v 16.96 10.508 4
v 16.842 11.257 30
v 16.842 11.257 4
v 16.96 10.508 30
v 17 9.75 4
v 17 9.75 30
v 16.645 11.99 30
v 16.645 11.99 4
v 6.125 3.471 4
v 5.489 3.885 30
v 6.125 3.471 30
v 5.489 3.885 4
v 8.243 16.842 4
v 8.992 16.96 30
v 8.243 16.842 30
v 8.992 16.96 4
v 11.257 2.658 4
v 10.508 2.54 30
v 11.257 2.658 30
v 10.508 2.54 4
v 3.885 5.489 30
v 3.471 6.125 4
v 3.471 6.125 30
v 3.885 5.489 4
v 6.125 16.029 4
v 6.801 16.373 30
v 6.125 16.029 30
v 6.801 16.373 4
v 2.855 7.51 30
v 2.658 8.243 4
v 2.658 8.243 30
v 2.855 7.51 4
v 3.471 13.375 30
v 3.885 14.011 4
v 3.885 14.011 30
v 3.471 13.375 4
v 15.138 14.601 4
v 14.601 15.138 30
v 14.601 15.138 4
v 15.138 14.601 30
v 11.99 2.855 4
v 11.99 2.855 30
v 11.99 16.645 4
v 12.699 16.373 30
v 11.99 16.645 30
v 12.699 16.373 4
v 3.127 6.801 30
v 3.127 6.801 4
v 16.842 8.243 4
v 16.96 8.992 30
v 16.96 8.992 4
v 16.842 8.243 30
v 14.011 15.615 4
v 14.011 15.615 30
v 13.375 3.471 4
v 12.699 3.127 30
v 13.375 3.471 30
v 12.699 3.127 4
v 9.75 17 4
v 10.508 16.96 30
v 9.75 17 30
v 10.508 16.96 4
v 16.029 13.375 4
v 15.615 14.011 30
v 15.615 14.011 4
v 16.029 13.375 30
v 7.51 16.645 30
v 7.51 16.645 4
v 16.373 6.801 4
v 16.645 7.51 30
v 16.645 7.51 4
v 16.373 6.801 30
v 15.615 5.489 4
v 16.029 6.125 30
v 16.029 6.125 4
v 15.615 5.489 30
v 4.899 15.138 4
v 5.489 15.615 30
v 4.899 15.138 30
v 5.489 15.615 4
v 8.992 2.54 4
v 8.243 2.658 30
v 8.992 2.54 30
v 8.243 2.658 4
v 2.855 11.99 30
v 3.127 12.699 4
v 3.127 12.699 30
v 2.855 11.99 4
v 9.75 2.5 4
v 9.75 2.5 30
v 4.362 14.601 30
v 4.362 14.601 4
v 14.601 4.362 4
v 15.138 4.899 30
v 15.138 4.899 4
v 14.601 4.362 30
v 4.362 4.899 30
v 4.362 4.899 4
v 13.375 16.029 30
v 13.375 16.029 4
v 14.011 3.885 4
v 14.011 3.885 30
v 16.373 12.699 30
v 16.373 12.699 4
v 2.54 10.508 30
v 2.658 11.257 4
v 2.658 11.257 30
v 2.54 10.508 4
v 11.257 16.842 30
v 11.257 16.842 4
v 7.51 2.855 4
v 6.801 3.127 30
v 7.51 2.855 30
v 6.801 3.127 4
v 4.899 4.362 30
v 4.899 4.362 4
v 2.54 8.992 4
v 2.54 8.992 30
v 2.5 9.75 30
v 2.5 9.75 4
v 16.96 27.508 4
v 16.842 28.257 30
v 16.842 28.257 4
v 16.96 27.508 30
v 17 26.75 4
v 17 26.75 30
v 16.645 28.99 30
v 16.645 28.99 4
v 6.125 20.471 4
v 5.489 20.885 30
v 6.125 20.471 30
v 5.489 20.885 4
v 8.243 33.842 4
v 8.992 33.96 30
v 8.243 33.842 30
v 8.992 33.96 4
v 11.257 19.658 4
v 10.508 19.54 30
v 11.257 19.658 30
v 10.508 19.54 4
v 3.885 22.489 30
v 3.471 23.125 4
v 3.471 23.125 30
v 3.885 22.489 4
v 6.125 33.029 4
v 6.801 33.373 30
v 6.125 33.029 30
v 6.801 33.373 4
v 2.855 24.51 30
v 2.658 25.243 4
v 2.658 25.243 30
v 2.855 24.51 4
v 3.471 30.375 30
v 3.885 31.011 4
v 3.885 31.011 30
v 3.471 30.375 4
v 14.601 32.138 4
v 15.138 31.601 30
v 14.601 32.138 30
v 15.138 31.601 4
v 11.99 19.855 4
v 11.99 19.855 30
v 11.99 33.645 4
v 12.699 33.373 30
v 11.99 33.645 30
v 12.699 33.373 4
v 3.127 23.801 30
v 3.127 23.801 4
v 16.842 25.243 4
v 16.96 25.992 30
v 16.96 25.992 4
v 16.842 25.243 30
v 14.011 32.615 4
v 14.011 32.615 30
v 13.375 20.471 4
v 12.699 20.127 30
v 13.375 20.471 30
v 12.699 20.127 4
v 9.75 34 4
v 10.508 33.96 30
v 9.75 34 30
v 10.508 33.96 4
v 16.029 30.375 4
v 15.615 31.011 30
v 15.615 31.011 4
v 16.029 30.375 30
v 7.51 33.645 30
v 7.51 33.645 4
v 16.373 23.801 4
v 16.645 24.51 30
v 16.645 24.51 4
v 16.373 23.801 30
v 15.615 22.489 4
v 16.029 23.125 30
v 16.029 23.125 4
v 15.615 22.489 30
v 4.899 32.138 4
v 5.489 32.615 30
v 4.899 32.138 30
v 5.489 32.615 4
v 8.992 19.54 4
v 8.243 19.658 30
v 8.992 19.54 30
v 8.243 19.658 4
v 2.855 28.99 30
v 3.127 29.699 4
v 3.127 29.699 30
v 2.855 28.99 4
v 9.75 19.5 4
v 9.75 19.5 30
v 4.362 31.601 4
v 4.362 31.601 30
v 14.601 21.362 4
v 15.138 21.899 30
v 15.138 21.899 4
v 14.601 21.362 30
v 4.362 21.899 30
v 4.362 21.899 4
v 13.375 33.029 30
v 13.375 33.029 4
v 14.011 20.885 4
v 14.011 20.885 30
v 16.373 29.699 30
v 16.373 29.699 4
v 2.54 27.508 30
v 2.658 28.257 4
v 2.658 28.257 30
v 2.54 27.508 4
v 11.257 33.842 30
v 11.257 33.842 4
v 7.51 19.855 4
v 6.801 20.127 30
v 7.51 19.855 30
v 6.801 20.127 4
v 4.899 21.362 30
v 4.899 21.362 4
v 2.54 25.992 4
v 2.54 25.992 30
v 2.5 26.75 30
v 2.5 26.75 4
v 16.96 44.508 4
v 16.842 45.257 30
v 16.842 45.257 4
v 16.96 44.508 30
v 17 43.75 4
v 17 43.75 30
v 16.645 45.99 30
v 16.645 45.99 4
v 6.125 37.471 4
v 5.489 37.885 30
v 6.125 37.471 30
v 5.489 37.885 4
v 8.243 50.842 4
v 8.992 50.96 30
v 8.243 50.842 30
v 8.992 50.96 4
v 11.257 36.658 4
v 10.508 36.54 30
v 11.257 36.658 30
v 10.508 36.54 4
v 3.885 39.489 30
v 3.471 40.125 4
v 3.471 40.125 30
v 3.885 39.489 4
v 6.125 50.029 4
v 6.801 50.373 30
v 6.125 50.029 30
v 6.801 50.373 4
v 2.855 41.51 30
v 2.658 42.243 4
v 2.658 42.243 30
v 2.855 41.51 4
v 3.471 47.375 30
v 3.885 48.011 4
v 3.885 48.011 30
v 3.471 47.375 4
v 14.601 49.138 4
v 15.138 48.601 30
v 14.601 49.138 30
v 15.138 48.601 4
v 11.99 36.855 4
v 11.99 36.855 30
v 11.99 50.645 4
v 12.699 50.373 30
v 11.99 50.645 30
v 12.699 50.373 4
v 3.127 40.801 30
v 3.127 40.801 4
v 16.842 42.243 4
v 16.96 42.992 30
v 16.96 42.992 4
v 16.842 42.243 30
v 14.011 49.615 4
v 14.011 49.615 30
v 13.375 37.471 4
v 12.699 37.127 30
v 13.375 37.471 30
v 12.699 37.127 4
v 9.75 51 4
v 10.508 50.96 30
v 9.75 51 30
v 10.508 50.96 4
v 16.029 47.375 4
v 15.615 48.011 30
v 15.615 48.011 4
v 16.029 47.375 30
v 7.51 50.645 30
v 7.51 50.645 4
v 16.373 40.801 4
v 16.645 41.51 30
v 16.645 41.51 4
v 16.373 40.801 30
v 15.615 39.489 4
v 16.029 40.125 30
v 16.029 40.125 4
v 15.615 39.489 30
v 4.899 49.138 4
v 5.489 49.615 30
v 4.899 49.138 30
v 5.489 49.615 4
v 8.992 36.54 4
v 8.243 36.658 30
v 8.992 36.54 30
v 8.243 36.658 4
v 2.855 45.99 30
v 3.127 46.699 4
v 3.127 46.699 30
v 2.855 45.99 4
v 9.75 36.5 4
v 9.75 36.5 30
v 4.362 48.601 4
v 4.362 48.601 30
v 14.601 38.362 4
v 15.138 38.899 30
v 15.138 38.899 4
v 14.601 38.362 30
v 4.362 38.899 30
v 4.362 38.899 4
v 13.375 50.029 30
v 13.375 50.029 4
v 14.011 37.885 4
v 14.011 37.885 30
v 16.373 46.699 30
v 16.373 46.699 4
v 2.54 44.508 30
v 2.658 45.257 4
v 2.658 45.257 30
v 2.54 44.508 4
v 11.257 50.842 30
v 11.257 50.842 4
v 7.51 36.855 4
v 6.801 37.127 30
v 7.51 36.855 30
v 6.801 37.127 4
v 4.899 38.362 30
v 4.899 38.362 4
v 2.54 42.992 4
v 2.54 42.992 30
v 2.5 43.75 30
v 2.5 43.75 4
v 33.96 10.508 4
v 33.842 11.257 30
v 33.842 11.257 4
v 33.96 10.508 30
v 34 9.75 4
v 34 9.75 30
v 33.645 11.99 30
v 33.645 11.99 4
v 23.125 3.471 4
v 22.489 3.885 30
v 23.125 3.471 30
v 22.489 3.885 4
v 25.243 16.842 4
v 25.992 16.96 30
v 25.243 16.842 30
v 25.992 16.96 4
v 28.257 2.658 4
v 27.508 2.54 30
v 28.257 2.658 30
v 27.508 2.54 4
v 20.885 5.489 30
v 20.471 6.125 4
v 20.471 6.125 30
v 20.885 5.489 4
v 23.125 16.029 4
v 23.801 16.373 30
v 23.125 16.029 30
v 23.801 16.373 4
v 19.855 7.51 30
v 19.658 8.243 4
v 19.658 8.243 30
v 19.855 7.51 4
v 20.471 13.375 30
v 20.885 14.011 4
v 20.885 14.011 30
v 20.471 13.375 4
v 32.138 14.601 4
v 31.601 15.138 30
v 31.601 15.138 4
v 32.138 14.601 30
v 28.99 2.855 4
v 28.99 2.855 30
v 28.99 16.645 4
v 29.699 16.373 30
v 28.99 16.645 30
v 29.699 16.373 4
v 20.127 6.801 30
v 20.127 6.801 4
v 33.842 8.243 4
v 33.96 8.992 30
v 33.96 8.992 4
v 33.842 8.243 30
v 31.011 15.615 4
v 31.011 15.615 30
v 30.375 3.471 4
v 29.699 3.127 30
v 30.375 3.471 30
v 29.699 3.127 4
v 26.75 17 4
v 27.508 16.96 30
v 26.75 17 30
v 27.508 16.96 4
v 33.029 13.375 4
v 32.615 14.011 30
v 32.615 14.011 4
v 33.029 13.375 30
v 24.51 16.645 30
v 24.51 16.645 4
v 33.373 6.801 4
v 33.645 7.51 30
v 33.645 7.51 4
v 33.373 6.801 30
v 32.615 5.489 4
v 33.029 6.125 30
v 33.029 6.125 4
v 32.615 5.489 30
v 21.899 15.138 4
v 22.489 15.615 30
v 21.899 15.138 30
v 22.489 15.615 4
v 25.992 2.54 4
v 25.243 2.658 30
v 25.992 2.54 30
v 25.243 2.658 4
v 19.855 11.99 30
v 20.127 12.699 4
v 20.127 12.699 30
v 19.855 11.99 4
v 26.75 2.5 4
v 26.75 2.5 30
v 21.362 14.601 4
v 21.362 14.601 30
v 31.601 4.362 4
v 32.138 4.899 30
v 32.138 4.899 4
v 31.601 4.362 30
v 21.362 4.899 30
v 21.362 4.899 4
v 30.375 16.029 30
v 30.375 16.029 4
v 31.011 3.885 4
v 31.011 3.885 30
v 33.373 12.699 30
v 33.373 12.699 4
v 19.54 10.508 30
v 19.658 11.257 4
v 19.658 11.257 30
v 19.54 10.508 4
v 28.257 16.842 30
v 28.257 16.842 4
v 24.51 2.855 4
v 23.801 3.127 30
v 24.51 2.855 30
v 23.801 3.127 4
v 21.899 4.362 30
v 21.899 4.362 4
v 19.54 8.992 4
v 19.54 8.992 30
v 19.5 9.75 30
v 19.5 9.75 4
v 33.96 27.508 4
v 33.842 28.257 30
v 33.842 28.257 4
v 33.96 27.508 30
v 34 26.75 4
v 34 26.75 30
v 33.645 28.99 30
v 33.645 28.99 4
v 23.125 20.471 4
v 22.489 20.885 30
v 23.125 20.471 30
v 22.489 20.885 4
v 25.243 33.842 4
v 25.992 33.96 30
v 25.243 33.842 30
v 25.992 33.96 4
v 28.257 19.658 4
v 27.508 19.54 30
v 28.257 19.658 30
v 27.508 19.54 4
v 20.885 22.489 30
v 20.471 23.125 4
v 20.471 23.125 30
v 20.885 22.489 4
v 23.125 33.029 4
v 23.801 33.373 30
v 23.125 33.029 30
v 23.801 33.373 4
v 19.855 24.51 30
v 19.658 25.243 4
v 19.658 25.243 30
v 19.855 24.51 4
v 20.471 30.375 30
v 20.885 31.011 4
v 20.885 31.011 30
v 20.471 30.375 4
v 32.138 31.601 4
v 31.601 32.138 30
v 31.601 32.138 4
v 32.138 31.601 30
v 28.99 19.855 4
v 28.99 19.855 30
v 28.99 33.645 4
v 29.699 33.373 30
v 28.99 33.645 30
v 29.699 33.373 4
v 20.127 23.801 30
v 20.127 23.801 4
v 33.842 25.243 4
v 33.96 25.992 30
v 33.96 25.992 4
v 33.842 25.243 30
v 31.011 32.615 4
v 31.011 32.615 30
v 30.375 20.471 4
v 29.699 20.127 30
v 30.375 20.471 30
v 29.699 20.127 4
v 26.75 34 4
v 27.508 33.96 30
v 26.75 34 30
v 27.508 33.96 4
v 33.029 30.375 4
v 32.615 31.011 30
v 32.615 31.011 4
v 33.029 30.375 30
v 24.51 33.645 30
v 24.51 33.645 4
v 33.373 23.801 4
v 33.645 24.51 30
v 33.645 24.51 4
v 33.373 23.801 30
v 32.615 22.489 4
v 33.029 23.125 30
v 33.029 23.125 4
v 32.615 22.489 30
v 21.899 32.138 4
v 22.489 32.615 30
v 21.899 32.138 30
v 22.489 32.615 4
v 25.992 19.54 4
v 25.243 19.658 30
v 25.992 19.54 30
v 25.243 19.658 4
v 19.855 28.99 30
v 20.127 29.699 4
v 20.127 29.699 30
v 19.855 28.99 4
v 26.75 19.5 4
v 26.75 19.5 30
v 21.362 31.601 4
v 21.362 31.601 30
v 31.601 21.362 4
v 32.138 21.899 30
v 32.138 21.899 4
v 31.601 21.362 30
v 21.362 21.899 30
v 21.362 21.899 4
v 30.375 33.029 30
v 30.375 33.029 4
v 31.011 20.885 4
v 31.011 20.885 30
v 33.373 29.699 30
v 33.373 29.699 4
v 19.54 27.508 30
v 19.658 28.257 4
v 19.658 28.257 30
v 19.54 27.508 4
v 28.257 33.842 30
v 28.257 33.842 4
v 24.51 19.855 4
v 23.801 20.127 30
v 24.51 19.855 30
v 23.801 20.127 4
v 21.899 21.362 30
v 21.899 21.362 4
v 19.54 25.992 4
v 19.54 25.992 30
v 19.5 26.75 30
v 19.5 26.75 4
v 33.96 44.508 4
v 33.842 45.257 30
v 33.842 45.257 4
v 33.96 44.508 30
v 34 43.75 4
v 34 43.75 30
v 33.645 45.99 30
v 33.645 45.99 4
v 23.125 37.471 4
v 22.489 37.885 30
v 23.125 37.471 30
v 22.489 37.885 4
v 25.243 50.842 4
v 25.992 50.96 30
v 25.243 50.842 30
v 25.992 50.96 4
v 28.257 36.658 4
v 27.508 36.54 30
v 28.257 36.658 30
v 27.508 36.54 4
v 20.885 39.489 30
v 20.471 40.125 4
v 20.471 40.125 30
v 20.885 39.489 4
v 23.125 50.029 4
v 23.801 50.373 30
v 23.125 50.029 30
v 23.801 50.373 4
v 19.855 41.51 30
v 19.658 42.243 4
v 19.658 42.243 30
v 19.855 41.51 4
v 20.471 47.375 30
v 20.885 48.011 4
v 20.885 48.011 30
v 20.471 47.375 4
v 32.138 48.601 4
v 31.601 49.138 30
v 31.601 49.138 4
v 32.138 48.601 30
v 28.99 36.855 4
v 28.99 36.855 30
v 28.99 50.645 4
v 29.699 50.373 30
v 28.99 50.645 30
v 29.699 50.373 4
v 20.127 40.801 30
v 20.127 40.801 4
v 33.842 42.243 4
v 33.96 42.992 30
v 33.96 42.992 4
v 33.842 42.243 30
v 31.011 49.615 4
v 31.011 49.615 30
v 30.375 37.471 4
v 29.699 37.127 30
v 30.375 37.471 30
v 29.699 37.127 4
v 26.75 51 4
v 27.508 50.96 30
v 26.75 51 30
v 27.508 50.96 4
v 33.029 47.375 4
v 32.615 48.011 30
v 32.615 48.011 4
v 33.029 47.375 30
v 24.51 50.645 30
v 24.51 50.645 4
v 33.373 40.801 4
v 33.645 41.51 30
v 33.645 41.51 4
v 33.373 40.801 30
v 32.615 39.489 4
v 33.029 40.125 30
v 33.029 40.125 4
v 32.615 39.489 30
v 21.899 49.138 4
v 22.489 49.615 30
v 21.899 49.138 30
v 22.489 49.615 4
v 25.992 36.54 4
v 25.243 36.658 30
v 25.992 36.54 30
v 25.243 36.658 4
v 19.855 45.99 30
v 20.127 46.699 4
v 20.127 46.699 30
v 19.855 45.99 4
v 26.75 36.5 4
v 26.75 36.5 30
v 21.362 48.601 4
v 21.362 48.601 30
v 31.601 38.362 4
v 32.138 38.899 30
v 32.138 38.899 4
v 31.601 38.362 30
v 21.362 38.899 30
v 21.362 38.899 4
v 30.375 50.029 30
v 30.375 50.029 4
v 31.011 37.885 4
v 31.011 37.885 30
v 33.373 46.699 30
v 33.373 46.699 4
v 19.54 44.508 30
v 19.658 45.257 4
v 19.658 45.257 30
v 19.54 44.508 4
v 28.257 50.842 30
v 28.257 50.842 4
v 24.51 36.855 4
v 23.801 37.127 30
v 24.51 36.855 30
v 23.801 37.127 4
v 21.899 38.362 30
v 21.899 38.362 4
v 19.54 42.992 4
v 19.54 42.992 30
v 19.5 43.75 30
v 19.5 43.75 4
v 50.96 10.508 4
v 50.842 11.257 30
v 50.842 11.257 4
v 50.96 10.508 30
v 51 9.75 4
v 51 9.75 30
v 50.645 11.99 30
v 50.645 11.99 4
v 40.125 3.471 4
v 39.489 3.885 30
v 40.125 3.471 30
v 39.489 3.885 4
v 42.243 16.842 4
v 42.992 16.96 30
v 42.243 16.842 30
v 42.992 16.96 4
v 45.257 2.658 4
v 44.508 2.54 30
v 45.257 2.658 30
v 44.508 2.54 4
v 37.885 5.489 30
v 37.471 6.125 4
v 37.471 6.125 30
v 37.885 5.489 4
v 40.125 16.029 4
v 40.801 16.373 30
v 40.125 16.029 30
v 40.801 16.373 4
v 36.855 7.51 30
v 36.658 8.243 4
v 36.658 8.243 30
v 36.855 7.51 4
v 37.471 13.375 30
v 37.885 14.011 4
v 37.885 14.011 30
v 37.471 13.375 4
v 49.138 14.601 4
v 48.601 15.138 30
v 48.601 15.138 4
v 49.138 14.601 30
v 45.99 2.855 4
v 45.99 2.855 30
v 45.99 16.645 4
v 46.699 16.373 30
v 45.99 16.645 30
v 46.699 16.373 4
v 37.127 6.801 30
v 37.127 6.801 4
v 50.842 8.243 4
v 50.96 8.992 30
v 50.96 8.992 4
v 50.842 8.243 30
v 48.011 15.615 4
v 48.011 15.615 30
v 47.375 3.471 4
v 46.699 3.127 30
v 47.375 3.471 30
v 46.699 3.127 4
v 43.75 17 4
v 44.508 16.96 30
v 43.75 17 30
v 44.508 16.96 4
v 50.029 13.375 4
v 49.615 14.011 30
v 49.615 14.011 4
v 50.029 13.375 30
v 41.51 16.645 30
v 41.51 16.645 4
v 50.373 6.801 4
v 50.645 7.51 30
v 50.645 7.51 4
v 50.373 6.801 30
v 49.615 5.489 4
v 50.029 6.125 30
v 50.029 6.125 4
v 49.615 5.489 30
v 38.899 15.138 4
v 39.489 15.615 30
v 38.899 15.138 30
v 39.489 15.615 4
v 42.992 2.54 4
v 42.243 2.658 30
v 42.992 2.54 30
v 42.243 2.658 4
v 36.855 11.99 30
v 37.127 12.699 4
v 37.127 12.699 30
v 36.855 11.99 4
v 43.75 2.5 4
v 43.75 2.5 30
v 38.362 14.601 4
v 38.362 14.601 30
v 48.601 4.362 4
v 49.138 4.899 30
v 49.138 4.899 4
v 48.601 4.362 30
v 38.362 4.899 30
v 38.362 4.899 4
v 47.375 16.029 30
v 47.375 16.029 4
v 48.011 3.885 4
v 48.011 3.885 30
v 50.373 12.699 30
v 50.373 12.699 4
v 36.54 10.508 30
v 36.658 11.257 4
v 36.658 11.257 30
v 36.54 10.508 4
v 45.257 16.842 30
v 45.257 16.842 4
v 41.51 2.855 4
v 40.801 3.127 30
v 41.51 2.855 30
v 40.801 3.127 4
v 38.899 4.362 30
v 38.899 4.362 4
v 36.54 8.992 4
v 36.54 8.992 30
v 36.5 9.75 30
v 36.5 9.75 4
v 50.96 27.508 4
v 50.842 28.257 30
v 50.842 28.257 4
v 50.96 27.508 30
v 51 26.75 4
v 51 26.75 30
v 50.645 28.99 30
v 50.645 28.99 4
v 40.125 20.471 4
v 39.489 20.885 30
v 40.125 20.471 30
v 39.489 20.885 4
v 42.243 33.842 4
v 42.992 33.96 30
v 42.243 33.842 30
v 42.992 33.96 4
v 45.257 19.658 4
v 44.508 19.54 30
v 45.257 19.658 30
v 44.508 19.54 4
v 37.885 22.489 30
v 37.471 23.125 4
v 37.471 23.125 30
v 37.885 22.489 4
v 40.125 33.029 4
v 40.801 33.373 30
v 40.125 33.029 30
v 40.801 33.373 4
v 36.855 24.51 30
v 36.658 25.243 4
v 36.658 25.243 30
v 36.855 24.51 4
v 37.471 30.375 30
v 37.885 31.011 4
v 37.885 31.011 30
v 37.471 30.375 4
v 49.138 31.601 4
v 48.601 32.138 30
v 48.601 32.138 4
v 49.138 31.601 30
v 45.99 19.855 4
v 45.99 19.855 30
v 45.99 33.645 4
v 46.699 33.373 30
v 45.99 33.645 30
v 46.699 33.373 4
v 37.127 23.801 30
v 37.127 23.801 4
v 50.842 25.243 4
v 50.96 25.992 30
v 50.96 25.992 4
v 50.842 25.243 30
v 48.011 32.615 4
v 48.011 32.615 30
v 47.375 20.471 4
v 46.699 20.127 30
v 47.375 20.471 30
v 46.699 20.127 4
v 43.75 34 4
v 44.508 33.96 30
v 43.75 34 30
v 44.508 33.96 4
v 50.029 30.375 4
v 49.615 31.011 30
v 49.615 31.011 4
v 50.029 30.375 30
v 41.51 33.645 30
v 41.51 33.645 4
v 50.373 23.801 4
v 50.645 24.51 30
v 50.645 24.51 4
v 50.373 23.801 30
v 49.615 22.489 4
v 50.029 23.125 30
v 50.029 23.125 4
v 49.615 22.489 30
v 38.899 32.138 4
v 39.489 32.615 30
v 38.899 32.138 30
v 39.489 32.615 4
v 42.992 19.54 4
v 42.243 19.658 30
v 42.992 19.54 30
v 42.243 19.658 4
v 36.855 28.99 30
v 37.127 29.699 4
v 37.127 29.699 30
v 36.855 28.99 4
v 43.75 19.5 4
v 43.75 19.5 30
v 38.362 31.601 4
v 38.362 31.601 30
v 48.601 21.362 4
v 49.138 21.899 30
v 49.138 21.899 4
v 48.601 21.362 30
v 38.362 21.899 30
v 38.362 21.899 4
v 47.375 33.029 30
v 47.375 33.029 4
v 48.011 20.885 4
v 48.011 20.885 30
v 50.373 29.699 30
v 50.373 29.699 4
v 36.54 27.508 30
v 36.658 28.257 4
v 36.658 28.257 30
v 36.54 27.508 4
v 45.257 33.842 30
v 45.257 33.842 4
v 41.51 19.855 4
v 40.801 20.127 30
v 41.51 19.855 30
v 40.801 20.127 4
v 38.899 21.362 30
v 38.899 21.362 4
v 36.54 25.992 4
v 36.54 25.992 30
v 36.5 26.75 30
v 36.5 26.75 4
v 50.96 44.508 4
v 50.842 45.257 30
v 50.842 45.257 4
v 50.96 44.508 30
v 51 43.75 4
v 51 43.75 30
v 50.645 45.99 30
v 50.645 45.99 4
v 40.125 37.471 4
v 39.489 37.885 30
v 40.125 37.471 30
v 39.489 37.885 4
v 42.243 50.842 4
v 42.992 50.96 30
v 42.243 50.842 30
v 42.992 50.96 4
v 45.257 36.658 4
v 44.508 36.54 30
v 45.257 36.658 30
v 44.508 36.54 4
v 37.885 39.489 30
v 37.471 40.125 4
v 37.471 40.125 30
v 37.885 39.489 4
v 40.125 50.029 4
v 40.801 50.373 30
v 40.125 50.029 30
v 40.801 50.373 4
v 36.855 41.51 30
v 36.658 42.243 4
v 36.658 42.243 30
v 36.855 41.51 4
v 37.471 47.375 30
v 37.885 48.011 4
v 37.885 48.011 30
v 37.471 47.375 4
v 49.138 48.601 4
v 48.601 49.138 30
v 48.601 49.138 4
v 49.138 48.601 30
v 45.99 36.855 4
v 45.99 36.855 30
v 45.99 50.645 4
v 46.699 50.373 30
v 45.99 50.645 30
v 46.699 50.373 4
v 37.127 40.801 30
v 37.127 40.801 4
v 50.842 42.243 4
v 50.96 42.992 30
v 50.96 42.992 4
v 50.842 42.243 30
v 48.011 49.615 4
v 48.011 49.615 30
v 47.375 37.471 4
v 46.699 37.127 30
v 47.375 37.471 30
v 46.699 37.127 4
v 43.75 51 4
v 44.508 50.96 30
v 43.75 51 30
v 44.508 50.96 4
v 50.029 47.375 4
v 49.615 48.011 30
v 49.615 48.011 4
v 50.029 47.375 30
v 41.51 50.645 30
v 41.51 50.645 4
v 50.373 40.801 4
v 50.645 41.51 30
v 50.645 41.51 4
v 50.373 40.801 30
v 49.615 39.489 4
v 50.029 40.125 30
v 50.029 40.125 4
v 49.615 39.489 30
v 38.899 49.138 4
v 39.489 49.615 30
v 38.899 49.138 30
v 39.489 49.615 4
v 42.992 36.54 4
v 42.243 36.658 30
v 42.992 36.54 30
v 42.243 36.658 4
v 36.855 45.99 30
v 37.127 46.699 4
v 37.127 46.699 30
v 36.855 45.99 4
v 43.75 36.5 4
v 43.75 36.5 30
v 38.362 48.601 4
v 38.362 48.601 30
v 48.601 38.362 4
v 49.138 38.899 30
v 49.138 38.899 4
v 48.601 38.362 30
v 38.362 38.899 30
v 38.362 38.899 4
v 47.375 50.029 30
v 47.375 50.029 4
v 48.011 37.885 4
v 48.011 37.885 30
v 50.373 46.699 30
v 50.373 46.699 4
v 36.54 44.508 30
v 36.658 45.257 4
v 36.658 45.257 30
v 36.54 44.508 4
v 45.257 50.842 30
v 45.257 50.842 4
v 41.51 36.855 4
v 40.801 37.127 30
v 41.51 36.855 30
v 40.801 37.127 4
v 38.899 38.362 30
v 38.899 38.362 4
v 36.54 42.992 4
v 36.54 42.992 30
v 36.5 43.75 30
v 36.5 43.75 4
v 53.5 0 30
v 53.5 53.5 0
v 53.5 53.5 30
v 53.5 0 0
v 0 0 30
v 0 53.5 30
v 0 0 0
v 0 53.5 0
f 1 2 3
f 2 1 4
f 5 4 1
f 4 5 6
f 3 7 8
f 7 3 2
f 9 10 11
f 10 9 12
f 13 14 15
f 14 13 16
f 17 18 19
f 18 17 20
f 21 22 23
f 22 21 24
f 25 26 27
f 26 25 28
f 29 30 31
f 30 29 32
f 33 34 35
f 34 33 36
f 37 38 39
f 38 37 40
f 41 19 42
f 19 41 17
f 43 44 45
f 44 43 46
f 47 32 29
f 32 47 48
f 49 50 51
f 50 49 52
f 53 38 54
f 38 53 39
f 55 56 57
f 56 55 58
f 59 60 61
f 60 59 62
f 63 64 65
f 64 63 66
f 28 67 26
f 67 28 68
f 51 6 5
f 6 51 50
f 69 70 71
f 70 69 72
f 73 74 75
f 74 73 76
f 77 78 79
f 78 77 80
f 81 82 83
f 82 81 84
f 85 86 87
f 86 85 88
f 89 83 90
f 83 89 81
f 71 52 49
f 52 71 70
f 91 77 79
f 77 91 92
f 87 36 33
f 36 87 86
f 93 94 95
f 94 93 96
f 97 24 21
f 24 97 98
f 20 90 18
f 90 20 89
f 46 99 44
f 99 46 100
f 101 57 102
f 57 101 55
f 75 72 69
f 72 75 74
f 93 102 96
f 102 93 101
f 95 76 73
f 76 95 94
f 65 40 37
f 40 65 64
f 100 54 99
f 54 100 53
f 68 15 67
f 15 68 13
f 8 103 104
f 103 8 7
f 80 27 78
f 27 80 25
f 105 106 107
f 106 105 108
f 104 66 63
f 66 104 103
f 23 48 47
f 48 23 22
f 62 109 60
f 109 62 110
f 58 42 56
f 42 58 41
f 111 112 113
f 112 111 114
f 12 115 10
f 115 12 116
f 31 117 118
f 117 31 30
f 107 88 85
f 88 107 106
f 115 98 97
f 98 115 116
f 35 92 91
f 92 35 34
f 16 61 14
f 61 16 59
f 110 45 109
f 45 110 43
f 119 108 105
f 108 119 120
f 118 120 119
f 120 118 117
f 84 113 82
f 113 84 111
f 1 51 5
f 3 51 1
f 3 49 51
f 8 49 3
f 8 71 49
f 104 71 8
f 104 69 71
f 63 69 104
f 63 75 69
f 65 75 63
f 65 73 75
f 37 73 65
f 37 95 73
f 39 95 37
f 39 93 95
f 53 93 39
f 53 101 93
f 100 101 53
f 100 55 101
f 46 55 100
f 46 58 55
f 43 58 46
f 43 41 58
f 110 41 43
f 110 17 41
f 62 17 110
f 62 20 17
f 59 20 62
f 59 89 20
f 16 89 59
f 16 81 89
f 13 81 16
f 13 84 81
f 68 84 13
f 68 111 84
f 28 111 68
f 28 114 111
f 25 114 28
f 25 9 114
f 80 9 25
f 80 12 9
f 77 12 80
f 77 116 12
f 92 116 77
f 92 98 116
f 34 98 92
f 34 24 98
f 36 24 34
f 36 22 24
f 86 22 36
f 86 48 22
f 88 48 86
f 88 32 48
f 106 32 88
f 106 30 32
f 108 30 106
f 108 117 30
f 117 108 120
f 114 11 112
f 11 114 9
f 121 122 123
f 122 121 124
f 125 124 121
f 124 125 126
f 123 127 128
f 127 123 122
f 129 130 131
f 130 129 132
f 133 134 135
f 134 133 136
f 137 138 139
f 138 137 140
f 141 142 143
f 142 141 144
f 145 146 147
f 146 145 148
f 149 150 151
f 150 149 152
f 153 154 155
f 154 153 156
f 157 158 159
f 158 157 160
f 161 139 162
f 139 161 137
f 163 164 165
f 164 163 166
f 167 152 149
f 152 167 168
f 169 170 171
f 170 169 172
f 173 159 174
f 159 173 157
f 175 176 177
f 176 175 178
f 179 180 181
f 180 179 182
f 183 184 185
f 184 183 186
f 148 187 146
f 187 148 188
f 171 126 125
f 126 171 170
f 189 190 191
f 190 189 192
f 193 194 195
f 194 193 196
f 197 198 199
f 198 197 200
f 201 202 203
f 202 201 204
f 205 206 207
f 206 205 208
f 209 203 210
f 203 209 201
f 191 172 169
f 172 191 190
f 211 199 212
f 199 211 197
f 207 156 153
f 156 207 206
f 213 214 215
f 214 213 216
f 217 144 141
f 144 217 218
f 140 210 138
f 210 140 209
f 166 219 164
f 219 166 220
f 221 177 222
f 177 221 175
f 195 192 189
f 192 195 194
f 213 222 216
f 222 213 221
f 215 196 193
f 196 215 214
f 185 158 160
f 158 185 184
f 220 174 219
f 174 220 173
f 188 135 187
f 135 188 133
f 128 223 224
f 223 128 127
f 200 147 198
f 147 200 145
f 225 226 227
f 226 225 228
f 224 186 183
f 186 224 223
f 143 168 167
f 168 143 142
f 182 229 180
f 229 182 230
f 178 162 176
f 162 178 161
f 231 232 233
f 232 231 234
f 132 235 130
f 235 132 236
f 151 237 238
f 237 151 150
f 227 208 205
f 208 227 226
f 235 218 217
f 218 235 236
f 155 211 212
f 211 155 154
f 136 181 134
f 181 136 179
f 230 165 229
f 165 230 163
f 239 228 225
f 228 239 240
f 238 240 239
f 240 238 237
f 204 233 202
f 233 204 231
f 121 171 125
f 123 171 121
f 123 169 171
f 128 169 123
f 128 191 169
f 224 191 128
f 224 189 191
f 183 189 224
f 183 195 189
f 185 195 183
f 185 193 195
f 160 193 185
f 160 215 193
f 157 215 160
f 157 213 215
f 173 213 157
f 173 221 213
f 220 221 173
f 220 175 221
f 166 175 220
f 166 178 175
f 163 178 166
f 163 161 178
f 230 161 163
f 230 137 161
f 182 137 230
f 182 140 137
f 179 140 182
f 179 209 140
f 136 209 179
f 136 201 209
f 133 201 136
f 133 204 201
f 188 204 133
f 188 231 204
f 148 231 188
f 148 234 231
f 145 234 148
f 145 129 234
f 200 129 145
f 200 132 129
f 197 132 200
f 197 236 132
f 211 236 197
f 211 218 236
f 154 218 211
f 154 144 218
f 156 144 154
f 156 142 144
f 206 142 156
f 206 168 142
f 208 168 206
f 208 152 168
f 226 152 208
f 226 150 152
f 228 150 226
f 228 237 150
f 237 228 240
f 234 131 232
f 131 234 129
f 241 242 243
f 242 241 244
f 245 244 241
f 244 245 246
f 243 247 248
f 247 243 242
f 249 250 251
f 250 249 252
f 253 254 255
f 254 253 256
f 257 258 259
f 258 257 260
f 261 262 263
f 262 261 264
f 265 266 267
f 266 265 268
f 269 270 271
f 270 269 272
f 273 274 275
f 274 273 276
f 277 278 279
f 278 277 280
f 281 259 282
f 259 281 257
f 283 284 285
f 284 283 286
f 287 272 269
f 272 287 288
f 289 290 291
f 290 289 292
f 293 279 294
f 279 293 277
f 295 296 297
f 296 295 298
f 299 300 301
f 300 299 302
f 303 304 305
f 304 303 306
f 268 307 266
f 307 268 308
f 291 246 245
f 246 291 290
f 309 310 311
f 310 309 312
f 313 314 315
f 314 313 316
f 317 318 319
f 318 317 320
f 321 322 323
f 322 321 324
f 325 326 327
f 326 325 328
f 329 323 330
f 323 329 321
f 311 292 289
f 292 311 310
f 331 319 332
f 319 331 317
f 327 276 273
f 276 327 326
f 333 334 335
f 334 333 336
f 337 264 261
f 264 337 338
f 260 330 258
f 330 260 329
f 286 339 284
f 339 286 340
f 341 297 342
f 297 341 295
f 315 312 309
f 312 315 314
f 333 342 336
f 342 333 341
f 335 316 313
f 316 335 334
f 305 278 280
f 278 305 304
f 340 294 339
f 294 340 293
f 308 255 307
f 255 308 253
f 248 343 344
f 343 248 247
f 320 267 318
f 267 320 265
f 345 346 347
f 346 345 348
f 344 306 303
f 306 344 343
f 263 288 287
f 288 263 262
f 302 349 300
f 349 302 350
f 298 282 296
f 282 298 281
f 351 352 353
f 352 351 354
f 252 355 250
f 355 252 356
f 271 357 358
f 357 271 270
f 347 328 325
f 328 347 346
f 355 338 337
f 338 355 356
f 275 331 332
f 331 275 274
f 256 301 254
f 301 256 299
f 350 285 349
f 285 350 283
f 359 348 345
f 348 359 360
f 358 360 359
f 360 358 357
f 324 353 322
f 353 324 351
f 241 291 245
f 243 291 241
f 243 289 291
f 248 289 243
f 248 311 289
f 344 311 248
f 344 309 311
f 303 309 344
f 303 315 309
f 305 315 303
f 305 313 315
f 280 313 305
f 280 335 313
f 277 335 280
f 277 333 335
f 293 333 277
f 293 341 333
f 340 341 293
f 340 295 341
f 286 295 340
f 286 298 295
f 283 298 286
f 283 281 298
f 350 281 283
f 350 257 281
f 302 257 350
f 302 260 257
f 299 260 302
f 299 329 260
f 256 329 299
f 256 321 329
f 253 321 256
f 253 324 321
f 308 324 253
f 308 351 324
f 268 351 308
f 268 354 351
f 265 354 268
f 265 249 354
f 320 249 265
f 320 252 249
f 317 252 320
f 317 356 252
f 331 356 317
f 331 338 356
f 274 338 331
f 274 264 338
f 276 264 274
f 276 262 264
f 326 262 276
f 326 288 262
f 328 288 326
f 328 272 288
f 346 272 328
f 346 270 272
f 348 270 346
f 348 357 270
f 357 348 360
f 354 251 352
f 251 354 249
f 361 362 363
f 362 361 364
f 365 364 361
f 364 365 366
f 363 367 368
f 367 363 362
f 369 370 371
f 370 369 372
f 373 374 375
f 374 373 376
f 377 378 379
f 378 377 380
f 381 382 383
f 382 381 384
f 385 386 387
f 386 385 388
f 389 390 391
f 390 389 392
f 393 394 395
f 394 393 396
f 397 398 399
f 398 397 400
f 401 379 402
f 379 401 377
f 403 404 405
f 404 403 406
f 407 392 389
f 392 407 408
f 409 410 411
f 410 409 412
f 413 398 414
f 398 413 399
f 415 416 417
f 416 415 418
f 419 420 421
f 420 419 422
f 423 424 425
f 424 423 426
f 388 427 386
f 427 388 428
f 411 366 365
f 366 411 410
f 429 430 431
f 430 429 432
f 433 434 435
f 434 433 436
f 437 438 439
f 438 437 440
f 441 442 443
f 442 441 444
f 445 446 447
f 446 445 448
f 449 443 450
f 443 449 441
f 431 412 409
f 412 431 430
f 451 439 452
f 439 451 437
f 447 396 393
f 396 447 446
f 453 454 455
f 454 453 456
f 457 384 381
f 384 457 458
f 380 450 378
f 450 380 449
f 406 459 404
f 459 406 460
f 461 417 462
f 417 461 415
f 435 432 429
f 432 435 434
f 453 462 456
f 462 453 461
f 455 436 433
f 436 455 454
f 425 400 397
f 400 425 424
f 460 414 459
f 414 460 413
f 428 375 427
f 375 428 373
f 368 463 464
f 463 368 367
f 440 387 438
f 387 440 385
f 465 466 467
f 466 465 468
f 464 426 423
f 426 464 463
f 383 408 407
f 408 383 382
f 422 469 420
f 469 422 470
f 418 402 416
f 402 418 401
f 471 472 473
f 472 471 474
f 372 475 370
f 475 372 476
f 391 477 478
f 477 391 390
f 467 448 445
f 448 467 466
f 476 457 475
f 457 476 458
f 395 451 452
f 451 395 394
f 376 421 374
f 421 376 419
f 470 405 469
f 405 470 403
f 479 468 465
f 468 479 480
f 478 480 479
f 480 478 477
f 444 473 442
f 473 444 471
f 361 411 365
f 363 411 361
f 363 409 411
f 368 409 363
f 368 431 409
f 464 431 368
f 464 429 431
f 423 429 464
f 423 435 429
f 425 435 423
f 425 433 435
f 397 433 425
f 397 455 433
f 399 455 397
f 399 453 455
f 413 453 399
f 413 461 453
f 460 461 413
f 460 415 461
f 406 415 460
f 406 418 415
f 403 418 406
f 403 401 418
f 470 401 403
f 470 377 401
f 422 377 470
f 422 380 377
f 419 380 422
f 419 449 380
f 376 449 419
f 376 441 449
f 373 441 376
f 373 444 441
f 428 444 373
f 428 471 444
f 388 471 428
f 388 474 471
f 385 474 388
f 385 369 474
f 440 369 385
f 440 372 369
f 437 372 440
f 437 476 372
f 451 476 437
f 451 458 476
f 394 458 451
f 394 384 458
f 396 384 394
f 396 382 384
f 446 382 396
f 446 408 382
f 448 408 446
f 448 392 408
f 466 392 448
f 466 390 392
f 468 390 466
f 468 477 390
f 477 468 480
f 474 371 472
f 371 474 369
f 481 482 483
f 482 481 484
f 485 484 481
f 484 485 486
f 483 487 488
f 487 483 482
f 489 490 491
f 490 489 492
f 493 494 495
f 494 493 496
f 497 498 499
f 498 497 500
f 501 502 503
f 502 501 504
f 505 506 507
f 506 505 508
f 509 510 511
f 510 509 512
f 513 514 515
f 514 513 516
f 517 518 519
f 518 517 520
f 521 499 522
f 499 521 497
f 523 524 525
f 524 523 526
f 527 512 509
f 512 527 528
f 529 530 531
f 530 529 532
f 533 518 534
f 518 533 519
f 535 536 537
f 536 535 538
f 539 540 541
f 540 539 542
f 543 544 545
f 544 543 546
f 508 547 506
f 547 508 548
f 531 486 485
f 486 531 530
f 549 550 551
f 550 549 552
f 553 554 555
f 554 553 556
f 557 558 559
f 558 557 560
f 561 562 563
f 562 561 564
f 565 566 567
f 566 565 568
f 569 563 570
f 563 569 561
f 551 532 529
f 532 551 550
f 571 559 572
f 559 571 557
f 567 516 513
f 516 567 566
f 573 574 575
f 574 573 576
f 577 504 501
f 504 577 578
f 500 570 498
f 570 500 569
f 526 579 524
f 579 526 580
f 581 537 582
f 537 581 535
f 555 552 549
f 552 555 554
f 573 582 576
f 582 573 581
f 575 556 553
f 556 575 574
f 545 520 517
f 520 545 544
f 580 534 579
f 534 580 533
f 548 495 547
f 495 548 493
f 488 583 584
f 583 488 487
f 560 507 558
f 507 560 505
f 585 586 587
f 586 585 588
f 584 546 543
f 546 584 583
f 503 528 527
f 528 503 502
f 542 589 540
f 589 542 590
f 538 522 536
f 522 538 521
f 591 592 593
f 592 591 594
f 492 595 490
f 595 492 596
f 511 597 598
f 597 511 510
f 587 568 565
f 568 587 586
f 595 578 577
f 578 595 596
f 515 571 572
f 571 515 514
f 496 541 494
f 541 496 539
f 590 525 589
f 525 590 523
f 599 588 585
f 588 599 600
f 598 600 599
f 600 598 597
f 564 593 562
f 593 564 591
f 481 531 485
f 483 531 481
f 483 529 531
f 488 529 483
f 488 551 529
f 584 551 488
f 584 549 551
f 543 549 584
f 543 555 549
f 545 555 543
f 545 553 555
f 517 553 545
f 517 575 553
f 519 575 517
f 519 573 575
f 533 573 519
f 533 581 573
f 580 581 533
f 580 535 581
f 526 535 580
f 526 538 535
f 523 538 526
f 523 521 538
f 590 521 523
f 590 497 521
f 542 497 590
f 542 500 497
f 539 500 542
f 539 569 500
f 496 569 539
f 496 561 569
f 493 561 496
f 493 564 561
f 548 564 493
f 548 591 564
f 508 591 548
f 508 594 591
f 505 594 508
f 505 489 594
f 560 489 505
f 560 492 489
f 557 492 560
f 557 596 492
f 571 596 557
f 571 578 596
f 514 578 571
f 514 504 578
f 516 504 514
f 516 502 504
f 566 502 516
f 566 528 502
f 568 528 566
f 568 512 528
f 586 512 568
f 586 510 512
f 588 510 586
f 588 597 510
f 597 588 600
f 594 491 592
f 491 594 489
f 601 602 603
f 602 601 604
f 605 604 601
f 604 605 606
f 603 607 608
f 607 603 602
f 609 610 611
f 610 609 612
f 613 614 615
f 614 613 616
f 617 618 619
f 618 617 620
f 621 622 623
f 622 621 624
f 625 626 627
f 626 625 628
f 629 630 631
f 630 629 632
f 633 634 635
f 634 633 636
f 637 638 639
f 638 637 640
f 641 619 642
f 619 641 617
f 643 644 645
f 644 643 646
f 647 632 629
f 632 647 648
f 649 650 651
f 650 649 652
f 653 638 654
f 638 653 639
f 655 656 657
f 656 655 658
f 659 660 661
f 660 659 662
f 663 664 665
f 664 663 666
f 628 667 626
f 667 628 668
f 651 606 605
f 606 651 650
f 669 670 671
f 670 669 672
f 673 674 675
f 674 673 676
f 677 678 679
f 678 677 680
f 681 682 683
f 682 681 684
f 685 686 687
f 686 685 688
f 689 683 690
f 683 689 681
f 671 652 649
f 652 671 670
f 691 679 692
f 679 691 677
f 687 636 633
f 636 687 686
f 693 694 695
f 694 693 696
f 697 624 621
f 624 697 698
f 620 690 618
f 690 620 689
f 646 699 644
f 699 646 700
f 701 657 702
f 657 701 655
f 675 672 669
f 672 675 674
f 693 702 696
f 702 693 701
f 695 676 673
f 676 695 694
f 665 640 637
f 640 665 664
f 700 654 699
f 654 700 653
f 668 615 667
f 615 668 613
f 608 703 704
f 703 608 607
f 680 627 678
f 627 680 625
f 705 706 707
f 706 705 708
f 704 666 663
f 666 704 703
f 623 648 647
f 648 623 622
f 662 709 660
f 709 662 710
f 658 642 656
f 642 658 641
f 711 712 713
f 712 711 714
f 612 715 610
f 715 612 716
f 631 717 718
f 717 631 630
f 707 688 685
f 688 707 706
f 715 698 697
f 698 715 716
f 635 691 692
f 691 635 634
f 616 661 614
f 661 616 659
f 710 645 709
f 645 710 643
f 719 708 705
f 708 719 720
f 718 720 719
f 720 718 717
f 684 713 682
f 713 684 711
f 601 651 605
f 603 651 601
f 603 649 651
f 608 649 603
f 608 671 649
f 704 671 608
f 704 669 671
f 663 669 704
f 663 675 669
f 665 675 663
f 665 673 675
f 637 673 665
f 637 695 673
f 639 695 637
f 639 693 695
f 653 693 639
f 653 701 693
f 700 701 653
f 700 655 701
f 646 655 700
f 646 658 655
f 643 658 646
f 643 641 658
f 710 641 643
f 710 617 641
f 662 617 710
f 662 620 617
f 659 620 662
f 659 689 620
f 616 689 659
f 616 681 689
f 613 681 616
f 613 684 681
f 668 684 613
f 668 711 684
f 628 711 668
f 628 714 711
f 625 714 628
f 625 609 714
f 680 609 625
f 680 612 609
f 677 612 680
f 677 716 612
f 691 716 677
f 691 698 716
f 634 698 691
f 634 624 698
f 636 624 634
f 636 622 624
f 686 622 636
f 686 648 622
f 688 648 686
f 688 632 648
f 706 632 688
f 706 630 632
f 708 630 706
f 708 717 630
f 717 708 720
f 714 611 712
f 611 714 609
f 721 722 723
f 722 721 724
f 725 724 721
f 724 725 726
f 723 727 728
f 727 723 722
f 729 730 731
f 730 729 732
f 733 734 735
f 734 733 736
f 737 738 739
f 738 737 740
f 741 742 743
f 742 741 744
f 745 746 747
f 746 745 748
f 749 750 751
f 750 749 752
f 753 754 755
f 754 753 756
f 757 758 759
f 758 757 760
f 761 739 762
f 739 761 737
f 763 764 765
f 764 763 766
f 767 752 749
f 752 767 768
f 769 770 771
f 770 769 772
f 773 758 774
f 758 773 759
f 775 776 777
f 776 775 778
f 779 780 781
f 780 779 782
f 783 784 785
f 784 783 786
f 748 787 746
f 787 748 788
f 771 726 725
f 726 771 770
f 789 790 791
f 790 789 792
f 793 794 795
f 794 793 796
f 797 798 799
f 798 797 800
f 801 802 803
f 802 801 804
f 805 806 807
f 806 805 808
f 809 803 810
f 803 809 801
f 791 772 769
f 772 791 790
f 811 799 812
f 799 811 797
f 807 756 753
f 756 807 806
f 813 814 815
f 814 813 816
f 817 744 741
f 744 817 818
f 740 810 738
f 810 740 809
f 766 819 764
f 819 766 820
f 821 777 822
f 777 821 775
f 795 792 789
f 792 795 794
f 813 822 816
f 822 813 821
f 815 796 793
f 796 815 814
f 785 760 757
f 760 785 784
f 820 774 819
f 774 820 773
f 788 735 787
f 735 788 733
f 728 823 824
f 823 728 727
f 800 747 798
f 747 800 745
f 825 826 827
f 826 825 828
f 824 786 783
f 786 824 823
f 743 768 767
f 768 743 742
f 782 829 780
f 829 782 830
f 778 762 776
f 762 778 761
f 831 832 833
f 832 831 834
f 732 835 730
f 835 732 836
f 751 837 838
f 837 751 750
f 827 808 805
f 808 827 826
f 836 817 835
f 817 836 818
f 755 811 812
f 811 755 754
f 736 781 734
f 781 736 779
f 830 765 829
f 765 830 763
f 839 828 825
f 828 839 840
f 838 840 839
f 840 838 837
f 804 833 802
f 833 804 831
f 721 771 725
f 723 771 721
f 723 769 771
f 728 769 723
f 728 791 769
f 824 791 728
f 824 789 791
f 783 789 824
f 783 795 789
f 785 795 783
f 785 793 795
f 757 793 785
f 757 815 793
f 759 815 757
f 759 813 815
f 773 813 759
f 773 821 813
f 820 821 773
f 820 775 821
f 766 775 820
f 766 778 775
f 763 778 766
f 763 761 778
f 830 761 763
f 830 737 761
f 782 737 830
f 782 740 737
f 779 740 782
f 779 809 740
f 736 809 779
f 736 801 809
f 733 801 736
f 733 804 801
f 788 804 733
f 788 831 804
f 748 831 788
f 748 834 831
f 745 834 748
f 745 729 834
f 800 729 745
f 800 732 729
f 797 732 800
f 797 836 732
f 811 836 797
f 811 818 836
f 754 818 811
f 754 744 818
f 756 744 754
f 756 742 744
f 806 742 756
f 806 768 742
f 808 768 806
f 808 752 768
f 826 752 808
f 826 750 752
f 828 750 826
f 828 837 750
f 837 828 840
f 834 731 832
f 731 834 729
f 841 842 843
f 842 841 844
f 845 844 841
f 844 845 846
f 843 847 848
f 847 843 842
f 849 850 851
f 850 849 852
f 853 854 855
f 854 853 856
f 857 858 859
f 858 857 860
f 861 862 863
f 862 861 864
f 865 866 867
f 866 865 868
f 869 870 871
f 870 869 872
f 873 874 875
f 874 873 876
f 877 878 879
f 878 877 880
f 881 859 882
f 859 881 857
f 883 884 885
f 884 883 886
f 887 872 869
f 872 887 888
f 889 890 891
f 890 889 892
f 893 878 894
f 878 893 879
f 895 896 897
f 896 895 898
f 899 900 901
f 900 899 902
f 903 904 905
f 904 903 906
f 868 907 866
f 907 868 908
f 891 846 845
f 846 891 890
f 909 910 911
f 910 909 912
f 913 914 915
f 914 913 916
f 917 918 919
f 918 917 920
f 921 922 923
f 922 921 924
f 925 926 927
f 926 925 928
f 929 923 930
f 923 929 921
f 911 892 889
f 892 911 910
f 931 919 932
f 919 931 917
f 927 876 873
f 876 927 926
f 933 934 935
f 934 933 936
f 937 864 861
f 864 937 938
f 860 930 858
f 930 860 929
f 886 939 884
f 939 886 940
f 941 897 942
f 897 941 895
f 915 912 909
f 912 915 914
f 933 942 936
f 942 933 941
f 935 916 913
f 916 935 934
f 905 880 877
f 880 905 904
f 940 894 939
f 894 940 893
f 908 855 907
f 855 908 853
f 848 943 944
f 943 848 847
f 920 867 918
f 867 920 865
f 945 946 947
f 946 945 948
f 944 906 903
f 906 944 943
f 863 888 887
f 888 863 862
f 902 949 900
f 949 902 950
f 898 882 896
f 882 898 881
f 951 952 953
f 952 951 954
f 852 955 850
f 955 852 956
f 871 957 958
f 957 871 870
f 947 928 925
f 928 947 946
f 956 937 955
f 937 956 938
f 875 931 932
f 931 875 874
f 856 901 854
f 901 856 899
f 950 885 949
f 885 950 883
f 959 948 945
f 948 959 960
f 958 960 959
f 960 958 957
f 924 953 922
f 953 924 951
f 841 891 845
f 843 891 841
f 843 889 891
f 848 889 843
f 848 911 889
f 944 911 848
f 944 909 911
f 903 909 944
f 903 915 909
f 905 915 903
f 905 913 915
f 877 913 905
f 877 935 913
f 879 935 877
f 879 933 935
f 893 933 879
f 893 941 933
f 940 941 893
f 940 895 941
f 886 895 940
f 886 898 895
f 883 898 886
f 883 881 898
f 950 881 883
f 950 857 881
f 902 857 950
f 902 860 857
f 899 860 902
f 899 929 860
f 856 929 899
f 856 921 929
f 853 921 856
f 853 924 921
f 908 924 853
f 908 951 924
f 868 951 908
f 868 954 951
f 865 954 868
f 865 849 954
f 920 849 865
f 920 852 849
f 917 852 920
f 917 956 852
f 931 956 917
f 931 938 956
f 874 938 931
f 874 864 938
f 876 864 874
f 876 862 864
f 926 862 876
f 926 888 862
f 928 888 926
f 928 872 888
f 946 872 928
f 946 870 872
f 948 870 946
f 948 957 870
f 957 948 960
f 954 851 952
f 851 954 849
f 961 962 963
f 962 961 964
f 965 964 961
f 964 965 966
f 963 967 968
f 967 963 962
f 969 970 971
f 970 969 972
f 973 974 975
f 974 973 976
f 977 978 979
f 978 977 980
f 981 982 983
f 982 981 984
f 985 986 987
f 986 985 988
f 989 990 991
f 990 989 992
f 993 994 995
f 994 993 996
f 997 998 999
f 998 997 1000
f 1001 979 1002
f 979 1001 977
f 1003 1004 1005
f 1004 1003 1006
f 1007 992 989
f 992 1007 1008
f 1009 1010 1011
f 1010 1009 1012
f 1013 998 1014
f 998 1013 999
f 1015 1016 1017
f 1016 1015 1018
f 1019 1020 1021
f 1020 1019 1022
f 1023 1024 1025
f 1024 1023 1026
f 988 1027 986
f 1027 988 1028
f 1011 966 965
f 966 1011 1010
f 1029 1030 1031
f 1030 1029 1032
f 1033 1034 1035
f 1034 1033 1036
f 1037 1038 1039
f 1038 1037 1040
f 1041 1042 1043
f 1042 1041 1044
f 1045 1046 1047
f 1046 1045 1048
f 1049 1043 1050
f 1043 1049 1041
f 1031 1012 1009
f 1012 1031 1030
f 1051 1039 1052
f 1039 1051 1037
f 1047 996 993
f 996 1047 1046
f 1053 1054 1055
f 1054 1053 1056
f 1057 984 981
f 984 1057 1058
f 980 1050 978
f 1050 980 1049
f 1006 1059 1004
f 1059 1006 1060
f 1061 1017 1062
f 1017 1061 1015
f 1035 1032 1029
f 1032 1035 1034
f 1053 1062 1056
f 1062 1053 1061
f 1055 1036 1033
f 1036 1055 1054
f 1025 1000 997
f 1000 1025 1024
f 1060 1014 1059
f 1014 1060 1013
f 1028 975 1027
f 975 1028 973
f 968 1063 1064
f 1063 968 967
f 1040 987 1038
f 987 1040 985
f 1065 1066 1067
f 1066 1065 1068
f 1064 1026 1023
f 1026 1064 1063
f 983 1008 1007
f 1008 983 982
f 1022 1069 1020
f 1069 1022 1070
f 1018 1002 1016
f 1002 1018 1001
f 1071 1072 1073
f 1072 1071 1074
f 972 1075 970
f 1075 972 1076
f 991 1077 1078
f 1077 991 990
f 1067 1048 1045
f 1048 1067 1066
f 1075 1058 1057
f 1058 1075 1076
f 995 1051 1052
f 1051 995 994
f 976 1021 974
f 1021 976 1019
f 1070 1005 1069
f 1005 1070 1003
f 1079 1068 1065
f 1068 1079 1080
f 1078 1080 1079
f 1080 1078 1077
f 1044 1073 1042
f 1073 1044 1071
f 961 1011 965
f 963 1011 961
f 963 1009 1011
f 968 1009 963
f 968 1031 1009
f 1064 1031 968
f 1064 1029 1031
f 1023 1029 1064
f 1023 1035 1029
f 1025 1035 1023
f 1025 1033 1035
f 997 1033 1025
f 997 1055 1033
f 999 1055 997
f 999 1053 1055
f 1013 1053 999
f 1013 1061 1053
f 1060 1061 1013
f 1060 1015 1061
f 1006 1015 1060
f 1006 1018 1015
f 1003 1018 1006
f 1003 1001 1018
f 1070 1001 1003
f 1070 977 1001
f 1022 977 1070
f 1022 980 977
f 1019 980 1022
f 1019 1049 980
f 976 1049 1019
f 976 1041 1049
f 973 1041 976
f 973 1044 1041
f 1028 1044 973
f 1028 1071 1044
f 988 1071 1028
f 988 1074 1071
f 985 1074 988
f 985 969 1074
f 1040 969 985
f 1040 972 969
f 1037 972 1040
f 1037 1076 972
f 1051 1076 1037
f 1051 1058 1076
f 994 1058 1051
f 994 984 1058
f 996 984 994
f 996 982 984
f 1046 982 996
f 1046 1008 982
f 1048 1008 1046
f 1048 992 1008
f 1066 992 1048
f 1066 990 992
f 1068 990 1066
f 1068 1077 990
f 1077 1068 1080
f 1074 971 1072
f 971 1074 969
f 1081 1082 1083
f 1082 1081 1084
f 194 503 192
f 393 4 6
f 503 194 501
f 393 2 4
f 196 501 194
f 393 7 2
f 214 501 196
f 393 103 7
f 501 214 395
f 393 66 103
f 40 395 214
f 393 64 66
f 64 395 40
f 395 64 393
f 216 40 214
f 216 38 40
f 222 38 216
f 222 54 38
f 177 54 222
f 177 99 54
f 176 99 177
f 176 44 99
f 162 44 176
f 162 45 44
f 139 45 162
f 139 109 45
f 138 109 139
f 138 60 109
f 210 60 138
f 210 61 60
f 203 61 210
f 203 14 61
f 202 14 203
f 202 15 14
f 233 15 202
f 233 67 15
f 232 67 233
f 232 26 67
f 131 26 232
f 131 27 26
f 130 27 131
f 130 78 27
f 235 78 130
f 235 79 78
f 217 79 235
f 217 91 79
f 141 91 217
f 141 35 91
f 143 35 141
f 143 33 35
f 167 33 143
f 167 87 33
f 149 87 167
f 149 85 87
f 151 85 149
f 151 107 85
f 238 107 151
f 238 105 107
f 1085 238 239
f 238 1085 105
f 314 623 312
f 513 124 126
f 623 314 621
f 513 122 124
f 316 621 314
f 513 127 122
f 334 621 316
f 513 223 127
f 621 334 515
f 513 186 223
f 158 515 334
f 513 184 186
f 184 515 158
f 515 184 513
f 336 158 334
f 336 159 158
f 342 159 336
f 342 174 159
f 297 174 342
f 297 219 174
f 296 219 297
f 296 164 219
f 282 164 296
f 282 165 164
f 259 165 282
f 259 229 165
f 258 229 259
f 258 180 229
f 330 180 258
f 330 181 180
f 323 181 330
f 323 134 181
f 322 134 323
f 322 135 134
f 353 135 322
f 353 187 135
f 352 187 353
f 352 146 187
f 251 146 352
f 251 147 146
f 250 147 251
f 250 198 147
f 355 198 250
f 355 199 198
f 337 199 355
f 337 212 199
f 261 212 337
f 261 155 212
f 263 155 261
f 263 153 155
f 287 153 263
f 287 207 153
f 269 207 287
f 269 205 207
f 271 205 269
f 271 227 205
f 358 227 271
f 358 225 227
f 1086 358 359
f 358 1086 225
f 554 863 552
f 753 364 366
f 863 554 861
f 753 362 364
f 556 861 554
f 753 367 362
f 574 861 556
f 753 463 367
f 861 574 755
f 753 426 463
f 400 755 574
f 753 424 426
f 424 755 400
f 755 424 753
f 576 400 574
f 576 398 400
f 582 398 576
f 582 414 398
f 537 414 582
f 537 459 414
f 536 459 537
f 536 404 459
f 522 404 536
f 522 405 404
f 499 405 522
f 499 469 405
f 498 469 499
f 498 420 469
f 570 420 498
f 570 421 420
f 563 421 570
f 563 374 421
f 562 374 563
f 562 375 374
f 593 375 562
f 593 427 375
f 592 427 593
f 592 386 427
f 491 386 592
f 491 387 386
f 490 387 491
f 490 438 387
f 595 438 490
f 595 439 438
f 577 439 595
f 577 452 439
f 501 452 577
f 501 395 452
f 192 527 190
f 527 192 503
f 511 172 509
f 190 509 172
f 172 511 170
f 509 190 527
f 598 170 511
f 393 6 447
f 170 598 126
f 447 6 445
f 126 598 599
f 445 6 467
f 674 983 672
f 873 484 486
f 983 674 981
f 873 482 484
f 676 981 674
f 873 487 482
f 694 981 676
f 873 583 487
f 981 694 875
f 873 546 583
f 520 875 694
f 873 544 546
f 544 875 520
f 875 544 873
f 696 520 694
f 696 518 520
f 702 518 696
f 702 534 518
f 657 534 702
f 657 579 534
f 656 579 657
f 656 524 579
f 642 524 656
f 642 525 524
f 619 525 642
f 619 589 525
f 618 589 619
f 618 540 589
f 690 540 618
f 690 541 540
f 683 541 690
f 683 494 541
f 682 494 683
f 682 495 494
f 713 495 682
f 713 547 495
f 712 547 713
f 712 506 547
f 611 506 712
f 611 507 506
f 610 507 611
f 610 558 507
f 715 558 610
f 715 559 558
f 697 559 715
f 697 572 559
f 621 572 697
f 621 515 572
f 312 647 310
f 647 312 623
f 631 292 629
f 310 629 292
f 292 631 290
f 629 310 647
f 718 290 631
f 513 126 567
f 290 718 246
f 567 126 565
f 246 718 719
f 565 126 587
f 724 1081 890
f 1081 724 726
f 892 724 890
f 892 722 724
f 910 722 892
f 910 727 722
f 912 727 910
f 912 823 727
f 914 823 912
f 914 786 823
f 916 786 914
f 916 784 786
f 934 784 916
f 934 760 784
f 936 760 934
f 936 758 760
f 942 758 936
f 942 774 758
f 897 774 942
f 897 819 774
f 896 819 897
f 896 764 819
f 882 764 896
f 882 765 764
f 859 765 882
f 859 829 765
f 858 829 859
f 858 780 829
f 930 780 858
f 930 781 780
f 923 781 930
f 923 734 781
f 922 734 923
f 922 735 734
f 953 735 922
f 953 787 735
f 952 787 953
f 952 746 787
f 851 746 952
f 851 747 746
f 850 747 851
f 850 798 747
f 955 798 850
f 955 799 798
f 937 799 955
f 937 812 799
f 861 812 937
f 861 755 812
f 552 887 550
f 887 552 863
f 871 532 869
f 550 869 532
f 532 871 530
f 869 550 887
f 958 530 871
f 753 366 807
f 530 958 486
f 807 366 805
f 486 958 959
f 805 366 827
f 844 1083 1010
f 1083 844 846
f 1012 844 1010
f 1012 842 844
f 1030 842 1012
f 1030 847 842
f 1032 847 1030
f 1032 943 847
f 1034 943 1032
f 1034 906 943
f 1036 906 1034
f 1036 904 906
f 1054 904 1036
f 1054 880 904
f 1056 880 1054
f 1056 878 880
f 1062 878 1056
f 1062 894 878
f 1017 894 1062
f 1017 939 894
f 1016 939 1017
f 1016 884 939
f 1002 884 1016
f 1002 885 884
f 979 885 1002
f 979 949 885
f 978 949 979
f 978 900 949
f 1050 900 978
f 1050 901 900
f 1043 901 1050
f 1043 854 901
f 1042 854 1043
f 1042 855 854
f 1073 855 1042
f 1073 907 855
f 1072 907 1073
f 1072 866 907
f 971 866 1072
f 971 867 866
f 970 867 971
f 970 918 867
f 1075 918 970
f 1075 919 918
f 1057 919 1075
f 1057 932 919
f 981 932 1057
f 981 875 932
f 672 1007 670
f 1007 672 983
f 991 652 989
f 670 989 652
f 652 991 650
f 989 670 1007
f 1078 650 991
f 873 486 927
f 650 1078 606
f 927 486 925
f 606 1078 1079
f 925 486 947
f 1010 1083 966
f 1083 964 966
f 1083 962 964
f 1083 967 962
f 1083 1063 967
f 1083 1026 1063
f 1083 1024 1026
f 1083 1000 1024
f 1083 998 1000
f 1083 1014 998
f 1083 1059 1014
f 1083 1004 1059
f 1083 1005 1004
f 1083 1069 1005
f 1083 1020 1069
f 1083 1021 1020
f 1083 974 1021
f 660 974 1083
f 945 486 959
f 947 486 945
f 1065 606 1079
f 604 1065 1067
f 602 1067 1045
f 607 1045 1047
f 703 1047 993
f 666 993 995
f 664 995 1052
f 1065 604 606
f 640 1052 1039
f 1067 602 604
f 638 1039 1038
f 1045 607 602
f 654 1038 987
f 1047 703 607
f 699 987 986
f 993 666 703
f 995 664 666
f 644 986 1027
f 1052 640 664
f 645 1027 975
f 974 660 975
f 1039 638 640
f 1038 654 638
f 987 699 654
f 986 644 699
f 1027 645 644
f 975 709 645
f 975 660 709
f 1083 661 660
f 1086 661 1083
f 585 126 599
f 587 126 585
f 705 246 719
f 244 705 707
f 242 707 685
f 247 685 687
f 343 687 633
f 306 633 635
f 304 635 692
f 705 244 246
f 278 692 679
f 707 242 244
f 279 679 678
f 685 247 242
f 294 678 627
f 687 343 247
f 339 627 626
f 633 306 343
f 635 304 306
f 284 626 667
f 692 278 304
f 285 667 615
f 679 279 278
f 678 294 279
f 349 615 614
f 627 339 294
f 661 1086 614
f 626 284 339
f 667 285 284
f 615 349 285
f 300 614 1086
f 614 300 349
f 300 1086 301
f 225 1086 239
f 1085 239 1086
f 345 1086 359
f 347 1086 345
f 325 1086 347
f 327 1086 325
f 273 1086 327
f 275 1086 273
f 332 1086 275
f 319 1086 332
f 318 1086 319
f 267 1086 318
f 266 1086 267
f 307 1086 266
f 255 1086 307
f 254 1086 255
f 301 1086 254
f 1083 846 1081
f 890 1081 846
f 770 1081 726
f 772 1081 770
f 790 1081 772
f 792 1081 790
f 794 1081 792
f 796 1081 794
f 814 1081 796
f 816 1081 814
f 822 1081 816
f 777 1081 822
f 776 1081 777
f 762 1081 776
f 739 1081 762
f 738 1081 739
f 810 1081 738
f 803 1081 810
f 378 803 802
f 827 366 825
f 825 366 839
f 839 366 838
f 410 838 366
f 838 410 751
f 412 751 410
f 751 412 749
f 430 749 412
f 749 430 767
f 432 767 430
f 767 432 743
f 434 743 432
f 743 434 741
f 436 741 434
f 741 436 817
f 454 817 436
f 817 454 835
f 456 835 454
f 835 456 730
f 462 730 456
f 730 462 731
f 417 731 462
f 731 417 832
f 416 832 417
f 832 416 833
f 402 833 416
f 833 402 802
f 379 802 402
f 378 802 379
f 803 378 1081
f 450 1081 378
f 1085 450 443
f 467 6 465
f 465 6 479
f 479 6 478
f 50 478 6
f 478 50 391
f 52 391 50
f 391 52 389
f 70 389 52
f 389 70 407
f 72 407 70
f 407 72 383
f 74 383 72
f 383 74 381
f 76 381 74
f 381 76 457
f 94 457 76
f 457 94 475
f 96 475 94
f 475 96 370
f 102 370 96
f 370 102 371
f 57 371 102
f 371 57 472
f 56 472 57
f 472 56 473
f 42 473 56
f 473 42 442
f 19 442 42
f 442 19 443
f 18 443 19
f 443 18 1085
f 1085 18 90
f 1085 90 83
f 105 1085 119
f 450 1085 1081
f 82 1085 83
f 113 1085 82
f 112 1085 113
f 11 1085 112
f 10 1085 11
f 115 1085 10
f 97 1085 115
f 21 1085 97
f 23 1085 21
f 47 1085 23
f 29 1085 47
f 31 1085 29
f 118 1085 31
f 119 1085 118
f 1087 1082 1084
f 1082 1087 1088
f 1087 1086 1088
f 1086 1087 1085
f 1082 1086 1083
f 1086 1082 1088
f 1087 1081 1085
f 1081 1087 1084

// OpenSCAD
$fn = 60;

//Diameter of the vials to be held.
vial_diameter = 14.5; //[1:0.1:100]
//Gap or wall between the vials
vial_gap = 2.5; //[1:0.1:100]
//number of vials to hold -- square root of this number must be a whole number
number_of_vials = 9; //[1:100]
//the overall height of the holder
holder_height = 30; //[1:100]

difference() {
    cube([vial_diameter*sqrt(number_of_vials)+vial_gap*sqrt(number_of_vials)+vial_gap, vial_diameter*sqrt(number_of_vials)+vial_gap*sqrt(number_of_vials)+vial_gap, holder_height]);
    for (x=[1:sqrt(number_of_vials)], y=[1:sqrt(number_of_vials)]) {
        translate([-vial_diameter/2, -vial_diameter/2, 0]) {
            translate([(vial_diameter*x)+(vial_gap*x),(vial_diameter*y)+(vial_gap*y),4]) {
                color("purple") cylinder(r=vial_diameter/2, h=holder_height);
            }
        }
    }
}
